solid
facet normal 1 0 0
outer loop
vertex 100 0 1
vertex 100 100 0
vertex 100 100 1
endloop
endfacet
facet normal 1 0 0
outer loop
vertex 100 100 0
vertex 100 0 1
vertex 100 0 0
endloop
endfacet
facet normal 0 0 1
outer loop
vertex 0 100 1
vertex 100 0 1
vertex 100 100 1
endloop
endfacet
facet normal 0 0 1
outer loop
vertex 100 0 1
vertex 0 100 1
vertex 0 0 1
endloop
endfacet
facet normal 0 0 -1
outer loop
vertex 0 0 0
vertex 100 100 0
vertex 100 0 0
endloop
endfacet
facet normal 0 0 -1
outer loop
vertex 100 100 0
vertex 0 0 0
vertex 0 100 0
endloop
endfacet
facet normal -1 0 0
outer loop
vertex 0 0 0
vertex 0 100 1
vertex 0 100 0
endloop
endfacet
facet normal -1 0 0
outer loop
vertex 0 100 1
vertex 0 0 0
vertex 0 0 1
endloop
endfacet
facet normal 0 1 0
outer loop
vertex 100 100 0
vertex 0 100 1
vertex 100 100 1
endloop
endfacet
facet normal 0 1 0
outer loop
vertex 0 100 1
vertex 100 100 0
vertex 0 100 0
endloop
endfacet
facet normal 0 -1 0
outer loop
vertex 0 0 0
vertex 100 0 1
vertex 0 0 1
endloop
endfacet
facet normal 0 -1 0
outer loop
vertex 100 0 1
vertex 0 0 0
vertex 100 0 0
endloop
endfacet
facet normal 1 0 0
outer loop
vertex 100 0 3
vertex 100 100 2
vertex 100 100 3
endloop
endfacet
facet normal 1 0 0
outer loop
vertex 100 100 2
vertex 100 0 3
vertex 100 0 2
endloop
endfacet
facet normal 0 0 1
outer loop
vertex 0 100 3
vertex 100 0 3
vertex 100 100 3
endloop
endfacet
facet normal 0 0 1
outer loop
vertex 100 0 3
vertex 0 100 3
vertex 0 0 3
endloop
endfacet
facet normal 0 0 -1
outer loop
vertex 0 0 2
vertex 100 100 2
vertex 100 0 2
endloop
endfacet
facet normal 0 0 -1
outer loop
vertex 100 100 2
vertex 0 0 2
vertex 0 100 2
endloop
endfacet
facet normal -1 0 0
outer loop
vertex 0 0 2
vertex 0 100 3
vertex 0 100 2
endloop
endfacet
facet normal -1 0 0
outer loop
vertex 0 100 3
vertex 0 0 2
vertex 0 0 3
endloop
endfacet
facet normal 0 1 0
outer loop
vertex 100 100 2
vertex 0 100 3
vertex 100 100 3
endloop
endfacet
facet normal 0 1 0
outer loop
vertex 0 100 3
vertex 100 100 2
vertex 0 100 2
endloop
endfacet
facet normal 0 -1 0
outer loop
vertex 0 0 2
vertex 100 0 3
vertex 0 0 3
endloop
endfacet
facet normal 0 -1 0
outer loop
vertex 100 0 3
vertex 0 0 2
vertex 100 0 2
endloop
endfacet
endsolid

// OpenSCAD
cube(size=[100,100,1]);
translate([0, 0, 2])
cube(size=[100,100,1]);
